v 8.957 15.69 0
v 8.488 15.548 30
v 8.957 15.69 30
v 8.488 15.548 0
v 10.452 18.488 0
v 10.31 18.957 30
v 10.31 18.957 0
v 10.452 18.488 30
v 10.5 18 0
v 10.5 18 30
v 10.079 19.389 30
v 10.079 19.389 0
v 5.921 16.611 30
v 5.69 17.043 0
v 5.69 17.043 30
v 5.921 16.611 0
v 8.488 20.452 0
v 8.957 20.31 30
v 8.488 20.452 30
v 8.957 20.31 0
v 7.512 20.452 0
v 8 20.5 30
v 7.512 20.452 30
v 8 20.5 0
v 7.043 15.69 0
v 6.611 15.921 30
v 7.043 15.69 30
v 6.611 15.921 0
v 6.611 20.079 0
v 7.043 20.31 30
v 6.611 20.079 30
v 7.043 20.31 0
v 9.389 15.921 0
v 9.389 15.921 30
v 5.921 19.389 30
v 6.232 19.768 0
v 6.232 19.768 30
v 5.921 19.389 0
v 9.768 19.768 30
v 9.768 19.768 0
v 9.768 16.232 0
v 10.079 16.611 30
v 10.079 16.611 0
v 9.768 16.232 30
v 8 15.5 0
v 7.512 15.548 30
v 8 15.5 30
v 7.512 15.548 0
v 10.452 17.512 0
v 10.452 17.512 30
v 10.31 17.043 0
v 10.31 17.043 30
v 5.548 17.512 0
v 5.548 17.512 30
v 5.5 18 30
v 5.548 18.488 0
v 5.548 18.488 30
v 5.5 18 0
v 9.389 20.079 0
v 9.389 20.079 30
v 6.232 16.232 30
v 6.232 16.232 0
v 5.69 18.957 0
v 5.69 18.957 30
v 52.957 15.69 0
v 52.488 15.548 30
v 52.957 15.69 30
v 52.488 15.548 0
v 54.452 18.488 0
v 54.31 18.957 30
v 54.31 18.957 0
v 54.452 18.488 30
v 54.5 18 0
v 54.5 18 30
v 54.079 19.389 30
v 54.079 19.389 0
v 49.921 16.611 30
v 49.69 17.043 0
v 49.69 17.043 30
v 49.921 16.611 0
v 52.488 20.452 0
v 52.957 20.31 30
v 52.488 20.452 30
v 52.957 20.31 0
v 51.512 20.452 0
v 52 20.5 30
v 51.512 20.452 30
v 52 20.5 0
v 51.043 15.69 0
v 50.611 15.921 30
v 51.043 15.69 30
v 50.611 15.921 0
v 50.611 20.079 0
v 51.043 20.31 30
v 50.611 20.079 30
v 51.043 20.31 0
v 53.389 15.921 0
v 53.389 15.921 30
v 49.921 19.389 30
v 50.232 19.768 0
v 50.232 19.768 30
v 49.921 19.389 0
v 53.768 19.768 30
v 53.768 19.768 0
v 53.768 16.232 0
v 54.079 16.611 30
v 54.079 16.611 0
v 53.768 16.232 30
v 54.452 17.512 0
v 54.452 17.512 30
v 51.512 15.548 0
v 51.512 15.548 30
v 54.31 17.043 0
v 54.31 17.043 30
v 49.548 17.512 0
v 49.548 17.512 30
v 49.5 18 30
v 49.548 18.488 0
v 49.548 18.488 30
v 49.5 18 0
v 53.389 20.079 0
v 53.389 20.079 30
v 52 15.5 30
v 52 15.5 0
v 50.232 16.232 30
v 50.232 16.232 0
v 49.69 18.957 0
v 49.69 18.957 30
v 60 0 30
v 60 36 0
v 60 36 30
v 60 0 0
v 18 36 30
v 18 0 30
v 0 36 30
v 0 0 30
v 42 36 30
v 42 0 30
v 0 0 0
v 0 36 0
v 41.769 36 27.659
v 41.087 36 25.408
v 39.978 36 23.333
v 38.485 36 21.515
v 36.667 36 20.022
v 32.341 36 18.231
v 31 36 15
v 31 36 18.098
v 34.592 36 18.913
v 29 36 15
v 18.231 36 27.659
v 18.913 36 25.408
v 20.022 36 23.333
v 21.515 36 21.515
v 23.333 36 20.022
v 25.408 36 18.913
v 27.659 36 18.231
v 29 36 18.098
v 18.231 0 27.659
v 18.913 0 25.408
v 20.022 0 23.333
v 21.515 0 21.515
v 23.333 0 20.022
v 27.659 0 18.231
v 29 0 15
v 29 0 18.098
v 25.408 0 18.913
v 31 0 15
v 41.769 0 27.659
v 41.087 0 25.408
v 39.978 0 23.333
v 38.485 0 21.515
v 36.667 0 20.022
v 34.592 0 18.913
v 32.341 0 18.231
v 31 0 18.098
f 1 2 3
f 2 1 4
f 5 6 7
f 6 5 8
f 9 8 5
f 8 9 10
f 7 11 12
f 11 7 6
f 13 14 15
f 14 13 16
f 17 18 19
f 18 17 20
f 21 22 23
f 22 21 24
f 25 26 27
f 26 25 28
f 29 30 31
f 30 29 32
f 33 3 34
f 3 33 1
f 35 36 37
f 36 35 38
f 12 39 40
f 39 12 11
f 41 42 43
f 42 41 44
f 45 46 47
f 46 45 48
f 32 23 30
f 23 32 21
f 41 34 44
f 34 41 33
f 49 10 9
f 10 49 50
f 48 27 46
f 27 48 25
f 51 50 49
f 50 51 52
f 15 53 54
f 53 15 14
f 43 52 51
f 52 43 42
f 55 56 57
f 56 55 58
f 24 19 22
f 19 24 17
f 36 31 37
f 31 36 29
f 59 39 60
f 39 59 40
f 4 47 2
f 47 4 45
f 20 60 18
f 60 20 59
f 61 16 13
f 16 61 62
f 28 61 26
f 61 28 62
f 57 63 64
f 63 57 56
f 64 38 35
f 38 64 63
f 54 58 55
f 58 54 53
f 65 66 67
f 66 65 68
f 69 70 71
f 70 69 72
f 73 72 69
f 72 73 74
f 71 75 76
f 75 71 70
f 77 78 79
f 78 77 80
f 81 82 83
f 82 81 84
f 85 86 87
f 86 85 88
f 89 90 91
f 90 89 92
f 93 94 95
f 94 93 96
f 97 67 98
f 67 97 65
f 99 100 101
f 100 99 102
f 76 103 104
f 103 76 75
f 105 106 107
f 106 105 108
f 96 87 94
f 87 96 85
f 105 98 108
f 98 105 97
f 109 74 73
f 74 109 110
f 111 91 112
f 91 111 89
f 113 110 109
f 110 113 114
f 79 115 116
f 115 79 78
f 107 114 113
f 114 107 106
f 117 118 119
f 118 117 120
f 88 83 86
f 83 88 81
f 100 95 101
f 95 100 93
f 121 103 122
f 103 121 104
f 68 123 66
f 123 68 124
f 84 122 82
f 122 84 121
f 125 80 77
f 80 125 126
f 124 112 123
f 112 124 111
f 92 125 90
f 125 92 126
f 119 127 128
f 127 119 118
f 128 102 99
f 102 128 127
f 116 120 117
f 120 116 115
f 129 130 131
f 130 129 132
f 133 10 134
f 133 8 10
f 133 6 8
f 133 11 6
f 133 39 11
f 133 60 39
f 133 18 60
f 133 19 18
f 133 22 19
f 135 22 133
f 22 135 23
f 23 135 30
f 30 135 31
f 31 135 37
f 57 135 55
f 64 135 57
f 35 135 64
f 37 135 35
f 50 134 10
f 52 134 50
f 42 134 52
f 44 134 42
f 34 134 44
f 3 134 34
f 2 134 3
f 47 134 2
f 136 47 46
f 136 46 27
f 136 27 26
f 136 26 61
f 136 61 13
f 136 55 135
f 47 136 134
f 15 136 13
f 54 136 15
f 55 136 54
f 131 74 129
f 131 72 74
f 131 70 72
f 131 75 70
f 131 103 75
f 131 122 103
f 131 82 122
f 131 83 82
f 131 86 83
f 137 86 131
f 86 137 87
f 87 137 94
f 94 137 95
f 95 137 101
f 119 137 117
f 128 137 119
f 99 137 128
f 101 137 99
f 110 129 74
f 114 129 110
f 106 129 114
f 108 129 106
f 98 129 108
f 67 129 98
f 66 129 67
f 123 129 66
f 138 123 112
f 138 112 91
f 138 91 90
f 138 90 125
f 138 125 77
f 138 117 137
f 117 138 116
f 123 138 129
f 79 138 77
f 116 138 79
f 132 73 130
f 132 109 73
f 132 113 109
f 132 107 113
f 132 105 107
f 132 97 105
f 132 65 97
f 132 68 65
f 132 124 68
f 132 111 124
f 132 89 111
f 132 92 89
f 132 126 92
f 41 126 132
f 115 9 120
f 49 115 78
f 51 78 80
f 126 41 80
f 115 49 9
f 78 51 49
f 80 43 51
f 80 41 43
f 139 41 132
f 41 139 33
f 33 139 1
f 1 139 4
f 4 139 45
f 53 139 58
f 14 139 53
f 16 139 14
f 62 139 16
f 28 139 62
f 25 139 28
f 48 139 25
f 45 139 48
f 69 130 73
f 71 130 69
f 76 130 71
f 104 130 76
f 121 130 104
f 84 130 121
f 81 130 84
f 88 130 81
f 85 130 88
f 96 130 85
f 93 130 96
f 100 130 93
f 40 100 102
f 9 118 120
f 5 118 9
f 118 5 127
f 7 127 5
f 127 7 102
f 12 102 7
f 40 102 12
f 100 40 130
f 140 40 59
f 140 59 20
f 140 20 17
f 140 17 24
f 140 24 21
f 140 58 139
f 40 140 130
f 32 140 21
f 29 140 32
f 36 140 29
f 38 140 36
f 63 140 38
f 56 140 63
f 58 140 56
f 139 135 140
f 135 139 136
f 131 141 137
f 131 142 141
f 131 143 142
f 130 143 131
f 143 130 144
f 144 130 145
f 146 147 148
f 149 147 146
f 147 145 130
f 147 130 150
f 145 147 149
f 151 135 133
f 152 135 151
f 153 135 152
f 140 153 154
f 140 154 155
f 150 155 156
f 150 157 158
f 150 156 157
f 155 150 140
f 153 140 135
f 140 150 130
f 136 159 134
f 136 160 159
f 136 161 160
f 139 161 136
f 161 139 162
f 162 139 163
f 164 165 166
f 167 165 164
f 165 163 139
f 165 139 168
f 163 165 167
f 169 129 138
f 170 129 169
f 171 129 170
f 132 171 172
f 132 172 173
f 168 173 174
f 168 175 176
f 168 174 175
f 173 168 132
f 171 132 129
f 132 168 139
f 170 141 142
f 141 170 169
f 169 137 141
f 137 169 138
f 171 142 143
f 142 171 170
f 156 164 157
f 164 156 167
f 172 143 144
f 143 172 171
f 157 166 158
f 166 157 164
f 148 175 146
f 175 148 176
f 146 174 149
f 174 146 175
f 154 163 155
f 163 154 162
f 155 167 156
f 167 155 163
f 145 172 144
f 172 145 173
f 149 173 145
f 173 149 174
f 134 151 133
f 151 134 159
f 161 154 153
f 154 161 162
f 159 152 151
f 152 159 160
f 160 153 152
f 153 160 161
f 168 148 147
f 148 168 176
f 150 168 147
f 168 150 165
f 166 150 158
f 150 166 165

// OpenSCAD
$fn = 32;

// ----------------------------------------------------------------------
// Saddle clamp: split shaft clamp
// ----------------------------------------------------------------------

// --- parameters (mm) ---
blk_l = 60;               // block length, X
blk_w = 36;               // block width, Y
blk_h = 30;               // block height
clamp_r = 12;             // shaft groove radius
hole_r = 2.5;             // bolt hole radius
hole_m = 8;               // bolt hole margin from the ends
saw_w = 2;                // saw kerf width

saw_depth = clamp_r + 3;  // saw kerf depth

difference() {
  cube([blk_l, blk_w, blk_h]);
  translate([blk_l / 2, -1, blk_h])
    rotate([-90, 0, 0])
      cylinder(h = blk_w + 2, r = clamp_r);
  for (sx = [0, 1])
    translate([sx ? blk_l - hole_m : hole_m, blk_w / 2, -1])
      cylinder(r = hole_r, h = blk_h + 2);
  translate([blk_l / 2 - saw_w / 2, -1, blk_h - saw_depth])
    cube([saw_w, blk_w + 2, saw_depth + 1]);
}
